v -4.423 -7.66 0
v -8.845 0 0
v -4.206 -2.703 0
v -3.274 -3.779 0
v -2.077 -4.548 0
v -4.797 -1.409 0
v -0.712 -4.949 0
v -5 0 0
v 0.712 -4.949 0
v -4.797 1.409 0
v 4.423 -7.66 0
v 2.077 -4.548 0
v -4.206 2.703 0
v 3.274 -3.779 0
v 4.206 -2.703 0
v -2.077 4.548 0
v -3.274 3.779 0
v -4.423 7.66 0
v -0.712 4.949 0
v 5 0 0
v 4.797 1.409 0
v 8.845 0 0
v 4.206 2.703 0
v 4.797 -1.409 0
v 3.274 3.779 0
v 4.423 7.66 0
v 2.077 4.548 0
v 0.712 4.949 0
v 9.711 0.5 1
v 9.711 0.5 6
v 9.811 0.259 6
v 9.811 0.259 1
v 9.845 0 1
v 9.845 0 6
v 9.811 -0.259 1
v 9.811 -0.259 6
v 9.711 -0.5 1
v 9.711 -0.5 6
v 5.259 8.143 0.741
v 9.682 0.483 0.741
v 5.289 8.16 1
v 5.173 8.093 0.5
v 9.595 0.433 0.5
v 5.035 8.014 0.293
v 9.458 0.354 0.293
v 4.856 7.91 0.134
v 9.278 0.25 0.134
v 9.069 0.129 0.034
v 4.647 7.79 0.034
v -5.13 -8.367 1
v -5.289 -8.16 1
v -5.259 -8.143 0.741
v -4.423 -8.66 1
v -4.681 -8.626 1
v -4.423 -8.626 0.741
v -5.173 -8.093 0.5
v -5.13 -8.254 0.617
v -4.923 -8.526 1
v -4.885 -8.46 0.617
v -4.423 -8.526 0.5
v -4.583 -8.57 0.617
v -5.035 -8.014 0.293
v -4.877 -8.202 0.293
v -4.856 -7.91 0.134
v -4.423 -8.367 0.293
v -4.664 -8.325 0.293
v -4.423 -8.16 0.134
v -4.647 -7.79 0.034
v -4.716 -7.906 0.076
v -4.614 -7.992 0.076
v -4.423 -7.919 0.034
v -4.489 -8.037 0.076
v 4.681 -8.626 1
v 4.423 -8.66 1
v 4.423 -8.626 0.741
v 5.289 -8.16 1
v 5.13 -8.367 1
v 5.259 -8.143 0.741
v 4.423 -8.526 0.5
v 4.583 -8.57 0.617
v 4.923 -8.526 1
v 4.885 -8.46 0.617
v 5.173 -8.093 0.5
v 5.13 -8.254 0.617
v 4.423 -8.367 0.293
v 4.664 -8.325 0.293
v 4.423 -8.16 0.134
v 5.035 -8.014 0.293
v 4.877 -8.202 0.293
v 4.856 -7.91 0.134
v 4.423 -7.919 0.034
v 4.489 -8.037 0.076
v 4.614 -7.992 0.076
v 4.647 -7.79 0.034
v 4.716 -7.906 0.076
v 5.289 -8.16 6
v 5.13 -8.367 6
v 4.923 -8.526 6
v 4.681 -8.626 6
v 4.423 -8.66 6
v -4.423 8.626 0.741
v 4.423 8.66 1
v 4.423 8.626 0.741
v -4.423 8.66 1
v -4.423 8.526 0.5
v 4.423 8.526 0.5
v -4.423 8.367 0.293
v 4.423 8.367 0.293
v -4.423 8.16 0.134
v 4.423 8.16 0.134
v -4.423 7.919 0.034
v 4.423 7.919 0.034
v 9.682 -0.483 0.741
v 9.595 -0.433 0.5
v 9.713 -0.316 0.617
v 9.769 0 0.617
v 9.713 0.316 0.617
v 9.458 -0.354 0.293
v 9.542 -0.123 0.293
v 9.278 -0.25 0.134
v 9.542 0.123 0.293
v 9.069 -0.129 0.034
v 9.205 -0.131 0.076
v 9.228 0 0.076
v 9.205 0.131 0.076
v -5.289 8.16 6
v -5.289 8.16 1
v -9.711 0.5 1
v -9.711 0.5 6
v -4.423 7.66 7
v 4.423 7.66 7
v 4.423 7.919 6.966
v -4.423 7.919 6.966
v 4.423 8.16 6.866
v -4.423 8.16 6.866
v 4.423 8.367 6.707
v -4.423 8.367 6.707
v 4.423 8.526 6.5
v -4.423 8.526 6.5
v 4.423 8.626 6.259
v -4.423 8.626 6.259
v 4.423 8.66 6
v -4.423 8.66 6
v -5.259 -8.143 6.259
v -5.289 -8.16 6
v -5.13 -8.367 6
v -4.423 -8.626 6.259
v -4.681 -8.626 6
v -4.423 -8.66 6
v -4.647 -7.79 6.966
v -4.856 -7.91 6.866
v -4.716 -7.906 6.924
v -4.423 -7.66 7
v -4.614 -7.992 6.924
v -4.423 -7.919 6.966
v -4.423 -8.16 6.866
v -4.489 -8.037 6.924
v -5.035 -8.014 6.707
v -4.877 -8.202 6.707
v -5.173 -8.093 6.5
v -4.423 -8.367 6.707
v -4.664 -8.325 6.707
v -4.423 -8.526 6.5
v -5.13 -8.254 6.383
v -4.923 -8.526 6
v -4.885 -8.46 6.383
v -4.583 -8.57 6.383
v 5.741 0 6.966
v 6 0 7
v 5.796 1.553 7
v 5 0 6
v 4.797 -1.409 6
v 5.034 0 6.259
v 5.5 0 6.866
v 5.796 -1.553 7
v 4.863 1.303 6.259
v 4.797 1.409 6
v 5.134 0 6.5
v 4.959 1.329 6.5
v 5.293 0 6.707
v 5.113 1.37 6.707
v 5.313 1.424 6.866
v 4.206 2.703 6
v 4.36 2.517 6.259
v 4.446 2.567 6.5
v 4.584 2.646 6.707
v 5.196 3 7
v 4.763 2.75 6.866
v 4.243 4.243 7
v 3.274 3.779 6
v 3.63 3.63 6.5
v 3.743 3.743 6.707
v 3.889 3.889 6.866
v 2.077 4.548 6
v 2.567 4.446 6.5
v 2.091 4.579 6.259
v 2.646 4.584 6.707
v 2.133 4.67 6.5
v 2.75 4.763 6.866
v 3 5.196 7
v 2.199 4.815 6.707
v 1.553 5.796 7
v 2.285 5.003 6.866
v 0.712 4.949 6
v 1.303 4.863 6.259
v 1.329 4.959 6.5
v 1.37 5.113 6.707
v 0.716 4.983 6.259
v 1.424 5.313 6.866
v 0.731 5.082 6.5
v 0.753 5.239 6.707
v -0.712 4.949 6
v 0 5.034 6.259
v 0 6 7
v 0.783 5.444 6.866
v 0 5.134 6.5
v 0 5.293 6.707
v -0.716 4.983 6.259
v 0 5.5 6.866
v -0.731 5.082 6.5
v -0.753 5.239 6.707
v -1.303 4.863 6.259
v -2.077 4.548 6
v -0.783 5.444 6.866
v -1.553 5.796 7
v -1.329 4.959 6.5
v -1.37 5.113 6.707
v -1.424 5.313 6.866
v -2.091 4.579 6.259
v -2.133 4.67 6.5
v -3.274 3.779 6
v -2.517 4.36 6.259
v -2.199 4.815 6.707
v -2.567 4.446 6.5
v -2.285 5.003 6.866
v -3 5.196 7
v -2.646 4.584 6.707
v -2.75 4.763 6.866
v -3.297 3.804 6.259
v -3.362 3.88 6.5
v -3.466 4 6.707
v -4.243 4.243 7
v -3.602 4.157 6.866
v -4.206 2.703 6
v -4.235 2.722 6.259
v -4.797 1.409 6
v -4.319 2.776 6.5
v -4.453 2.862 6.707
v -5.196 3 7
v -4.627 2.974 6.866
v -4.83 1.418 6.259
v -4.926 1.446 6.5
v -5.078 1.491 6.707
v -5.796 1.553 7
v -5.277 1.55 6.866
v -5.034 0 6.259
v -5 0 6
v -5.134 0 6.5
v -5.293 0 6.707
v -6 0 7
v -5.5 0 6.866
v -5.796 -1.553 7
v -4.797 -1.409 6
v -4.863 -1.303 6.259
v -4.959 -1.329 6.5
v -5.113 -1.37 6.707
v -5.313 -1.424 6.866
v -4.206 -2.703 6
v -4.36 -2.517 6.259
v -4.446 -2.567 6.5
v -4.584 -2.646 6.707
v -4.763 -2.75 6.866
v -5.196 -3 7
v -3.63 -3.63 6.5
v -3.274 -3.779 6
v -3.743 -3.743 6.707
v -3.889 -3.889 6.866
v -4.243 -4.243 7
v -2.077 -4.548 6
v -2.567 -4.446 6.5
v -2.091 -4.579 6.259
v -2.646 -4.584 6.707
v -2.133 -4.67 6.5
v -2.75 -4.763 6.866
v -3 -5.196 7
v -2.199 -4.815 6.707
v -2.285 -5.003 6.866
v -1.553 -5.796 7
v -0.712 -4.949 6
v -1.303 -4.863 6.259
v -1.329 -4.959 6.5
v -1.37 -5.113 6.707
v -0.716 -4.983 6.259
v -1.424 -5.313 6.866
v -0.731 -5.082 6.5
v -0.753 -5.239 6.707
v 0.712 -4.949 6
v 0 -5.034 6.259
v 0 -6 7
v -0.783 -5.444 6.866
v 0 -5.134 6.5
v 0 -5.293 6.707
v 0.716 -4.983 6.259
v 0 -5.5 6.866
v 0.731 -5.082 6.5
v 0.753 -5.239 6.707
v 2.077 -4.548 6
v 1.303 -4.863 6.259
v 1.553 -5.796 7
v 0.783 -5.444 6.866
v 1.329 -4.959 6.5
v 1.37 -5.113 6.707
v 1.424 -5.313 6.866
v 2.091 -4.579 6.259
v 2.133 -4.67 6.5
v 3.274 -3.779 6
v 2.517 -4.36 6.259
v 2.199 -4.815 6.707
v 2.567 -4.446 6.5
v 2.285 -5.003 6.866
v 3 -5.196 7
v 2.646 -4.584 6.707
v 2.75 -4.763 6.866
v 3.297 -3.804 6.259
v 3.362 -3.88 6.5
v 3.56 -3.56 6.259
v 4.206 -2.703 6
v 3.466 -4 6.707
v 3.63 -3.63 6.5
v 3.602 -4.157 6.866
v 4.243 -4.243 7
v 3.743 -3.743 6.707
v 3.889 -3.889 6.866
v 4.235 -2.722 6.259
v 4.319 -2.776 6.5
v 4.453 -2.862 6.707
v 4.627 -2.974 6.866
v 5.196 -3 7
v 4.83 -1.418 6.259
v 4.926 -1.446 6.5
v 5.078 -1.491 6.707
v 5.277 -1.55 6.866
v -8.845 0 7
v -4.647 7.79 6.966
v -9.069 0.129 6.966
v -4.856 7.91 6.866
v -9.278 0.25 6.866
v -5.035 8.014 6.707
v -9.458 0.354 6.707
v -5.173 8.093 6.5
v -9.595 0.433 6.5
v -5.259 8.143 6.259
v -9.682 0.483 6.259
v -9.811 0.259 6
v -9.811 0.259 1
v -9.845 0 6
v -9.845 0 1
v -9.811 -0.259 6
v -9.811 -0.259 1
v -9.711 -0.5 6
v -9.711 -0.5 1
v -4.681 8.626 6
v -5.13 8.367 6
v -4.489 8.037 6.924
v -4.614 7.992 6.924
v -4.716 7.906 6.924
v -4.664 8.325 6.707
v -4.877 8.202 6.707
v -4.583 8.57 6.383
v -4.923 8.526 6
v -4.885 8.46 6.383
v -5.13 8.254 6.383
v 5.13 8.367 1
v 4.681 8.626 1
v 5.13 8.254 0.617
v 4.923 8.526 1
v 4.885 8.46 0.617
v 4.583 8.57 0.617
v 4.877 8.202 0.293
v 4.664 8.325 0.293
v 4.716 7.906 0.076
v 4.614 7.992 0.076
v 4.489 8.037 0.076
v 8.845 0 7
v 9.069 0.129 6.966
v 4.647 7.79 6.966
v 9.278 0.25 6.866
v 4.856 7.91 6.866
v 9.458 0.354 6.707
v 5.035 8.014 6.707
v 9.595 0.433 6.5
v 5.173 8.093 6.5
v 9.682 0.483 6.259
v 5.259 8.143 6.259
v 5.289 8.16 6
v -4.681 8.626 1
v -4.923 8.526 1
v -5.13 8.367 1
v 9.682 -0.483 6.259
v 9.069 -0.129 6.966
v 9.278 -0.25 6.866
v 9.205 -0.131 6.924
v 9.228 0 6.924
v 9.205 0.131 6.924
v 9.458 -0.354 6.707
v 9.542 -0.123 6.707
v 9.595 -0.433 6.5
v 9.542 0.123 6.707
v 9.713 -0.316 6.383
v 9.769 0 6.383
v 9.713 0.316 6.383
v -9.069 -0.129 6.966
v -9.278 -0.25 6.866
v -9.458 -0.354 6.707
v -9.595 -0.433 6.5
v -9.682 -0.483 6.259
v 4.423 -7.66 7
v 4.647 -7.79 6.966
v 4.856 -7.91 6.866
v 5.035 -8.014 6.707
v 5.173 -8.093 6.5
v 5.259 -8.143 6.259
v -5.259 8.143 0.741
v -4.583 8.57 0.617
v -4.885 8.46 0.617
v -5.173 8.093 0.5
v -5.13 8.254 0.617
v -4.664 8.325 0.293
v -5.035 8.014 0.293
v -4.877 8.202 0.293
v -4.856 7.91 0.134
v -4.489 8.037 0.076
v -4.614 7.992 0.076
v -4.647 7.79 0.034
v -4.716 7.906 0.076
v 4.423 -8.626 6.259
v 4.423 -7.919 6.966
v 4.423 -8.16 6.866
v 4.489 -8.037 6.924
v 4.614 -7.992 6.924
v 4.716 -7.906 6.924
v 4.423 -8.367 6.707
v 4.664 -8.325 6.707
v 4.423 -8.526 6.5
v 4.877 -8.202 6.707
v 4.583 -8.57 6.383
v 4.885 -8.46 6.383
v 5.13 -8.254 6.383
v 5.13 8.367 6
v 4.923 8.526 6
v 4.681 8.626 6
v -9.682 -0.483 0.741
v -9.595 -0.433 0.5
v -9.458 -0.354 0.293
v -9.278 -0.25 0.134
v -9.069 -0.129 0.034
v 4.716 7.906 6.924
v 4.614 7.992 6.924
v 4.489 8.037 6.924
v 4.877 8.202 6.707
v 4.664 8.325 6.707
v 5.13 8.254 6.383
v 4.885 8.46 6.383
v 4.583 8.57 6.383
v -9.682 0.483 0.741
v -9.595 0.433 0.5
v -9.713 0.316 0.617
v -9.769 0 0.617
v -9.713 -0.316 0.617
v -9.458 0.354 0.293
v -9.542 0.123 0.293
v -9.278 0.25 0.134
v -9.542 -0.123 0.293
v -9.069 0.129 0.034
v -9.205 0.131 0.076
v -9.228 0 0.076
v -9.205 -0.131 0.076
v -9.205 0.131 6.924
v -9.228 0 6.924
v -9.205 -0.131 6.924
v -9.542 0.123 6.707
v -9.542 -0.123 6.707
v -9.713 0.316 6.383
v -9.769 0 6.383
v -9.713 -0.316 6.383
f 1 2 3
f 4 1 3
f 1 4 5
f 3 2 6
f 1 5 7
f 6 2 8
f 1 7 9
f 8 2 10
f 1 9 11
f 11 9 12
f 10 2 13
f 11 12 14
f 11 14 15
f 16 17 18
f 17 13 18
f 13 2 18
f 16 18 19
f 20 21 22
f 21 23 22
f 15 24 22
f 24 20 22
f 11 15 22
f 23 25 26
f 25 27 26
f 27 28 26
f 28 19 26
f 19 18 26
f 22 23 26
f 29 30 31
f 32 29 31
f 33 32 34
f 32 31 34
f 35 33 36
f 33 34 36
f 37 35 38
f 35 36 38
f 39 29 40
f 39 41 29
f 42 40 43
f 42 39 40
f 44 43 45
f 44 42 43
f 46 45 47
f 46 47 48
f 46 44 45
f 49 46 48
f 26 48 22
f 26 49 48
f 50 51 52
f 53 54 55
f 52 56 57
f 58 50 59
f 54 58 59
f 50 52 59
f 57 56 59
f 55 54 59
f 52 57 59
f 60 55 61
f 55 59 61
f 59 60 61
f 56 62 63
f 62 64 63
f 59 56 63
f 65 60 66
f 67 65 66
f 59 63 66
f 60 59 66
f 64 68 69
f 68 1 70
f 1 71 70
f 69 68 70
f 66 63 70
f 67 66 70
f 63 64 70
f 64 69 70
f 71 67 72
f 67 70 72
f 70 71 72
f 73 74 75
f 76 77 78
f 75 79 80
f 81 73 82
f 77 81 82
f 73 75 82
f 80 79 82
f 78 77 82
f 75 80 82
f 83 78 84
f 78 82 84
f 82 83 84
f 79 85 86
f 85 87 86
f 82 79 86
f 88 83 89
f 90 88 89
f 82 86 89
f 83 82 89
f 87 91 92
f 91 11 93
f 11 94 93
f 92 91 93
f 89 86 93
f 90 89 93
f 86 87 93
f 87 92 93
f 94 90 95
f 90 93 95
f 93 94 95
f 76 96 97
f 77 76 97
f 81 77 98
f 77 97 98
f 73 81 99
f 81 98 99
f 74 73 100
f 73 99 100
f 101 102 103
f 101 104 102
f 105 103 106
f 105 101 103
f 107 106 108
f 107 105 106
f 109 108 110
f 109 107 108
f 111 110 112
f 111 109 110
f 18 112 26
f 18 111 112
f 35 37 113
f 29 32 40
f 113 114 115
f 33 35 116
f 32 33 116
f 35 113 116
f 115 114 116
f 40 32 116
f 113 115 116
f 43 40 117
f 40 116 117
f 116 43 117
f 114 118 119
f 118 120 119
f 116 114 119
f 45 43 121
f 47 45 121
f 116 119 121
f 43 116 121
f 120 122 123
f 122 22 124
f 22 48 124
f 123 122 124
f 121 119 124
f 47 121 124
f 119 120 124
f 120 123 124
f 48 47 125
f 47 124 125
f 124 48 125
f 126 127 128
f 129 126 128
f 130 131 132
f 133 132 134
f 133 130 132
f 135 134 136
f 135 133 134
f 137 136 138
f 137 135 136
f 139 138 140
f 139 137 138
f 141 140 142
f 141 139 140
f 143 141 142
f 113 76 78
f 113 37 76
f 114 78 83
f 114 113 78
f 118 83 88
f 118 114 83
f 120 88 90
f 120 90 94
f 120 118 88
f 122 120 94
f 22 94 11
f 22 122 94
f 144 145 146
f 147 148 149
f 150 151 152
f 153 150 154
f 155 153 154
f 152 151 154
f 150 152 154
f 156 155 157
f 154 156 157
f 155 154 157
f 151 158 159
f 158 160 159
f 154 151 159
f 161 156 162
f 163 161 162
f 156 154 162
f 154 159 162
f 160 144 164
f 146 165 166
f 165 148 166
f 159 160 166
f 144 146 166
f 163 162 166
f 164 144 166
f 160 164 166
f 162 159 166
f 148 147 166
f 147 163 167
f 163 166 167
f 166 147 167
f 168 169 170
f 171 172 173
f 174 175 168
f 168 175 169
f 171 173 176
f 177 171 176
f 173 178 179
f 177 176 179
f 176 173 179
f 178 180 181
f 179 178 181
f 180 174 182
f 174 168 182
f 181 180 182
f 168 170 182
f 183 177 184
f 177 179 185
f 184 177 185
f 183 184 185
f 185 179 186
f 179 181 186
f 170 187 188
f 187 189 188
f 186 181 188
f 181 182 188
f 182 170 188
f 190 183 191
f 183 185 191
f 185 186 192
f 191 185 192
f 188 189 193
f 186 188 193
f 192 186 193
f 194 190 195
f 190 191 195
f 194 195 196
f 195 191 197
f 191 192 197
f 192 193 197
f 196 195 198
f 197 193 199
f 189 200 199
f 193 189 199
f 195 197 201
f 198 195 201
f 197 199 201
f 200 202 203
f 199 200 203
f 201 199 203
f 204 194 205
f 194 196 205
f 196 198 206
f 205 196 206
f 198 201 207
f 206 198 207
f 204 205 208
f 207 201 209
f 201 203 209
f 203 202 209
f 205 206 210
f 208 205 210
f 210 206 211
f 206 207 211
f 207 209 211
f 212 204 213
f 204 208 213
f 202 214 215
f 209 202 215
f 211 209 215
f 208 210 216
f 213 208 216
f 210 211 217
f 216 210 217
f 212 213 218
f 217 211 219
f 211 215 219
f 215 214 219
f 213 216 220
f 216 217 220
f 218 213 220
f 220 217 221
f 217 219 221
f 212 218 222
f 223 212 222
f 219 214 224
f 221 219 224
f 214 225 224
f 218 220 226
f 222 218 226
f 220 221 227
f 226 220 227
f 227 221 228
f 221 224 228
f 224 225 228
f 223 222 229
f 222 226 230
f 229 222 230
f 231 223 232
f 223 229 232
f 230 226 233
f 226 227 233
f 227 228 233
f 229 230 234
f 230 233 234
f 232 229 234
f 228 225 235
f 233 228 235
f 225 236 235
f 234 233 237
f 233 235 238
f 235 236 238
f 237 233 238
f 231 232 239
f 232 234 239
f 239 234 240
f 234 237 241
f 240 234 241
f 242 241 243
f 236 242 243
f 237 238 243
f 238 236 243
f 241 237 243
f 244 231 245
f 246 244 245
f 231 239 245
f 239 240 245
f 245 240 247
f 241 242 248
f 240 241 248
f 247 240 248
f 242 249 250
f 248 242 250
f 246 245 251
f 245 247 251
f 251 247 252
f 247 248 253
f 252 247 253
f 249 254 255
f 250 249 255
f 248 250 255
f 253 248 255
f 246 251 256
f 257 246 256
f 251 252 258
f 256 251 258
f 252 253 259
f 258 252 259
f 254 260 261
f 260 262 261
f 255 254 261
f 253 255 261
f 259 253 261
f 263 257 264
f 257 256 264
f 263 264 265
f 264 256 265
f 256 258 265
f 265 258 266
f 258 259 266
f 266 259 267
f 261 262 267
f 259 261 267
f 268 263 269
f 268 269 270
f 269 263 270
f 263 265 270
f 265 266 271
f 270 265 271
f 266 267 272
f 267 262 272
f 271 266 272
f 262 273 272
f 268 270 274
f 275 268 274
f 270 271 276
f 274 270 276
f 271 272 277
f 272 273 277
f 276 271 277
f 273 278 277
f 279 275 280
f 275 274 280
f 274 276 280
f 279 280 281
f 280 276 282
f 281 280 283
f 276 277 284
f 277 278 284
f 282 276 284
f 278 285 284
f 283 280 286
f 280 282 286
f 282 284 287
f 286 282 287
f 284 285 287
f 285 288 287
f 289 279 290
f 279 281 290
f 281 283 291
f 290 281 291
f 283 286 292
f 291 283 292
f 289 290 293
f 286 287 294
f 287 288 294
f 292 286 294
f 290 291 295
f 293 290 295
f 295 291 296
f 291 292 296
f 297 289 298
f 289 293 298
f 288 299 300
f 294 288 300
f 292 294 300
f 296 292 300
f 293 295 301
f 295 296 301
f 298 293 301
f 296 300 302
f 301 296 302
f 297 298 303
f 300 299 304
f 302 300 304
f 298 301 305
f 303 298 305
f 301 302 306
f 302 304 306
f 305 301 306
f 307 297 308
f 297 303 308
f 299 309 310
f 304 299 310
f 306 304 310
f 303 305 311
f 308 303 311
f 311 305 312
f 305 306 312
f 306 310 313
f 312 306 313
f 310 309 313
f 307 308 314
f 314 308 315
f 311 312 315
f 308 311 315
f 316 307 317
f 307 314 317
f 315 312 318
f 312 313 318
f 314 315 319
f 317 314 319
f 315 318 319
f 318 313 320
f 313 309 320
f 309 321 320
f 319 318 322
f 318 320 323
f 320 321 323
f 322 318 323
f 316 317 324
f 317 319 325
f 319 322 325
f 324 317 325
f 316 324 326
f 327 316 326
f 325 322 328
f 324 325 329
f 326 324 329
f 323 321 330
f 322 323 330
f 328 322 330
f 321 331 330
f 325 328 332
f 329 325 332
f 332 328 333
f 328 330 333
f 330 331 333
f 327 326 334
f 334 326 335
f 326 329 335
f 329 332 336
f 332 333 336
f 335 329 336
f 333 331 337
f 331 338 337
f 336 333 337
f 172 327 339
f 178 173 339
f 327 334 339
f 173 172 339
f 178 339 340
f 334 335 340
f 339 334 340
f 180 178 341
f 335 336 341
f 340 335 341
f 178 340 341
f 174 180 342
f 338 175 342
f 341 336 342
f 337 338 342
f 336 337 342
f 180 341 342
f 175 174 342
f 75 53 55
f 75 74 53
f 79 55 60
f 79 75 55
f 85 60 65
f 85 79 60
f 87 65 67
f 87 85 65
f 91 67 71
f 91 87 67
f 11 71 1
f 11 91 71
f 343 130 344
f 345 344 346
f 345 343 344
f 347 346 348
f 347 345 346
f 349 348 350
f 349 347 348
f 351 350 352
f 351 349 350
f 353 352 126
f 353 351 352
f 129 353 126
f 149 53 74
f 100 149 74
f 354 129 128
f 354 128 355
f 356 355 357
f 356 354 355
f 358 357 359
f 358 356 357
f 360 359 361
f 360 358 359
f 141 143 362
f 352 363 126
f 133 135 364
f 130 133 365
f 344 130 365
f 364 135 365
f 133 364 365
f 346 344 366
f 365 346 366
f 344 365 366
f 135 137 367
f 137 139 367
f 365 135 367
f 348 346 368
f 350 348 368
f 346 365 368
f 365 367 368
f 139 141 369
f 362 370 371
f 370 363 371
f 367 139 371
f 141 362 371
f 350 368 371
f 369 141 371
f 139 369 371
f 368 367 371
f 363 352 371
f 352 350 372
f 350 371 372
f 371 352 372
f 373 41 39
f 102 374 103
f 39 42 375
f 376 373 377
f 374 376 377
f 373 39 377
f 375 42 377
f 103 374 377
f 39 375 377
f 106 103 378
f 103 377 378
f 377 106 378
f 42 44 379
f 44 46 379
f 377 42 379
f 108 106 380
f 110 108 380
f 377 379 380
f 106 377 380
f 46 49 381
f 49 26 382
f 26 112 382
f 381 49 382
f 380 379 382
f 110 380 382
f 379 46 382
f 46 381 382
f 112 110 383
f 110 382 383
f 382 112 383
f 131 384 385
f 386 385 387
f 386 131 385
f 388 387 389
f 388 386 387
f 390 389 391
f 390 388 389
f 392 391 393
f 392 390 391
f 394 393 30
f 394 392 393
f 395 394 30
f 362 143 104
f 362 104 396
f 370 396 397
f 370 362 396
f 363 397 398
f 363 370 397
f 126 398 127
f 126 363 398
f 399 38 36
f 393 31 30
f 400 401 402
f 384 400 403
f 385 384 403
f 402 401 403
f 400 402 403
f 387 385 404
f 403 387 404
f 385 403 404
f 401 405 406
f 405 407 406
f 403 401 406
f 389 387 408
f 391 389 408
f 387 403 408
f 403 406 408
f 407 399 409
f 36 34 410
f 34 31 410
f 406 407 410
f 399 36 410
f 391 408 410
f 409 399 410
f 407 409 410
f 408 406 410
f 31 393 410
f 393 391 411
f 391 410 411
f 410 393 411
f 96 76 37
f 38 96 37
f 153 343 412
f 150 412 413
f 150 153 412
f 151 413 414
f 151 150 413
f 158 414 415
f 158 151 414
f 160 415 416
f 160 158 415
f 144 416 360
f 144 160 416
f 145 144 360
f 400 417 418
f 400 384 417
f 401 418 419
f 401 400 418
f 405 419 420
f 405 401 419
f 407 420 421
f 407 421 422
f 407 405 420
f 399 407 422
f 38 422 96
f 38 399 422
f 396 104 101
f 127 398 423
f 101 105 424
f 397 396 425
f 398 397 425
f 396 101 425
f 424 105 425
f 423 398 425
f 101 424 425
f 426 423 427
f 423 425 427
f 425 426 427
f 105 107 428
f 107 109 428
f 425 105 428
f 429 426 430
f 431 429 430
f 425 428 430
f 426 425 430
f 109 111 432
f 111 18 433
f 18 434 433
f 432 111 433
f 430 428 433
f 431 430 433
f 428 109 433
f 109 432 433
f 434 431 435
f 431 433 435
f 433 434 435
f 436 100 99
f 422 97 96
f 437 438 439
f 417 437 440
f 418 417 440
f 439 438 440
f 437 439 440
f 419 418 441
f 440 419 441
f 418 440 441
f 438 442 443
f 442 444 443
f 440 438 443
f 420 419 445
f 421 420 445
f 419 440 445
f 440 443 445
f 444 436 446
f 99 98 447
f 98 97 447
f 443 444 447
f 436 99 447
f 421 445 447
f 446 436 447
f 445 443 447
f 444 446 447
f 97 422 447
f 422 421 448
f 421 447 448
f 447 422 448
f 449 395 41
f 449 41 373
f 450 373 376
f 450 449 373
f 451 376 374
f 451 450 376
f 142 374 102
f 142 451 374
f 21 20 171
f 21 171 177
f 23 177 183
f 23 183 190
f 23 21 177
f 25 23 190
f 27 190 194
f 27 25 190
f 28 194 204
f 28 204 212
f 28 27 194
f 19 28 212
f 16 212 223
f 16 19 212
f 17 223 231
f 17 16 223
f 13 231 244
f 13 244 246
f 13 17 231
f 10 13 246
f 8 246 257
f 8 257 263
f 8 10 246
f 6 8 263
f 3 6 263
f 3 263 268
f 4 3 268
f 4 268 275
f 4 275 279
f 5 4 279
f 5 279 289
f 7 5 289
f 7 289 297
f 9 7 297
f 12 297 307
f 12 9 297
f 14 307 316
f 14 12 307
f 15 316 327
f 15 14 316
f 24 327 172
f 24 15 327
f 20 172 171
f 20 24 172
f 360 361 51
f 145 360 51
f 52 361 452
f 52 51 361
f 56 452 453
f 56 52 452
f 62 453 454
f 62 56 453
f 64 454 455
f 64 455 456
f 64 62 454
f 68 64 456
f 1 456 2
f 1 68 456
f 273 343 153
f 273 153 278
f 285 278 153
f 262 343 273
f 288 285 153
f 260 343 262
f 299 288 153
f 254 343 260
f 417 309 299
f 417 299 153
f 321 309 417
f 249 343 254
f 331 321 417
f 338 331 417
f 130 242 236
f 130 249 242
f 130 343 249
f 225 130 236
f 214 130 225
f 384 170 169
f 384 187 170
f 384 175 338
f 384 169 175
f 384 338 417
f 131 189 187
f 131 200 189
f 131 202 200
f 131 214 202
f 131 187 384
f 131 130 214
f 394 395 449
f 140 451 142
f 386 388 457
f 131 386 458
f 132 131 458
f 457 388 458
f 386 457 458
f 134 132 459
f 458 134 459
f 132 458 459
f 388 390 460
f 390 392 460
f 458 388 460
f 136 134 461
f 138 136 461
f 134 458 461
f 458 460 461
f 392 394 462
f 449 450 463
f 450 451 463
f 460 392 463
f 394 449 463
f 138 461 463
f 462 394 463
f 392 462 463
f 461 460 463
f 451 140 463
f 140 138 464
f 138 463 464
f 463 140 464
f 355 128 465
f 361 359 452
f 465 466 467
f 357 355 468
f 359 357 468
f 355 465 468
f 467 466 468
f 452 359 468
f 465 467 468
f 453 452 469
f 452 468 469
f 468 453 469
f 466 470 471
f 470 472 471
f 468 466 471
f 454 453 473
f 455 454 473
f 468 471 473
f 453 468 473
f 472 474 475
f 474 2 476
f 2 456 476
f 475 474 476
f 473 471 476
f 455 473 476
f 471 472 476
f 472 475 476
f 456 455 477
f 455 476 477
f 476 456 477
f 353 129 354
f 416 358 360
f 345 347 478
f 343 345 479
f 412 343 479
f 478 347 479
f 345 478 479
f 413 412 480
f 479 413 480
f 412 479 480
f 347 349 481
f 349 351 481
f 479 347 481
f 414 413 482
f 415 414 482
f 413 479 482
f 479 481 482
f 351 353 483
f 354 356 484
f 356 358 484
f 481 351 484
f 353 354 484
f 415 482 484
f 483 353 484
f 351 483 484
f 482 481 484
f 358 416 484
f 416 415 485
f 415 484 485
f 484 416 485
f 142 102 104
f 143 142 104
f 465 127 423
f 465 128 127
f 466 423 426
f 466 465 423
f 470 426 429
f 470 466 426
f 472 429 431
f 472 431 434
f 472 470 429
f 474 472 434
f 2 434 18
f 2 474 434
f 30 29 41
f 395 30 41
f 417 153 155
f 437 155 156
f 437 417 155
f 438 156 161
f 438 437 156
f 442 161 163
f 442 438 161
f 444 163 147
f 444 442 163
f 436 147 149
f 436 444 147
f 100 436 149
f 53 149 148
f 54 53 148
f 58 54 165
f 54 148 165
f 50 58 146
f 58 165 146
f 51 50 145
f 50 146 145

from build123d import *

# Parameters (mm, degrees)
SKETCH1_R           = 5
BOSS_EXTRUDE1_DEPTH = 7
FILLET1_R           = 1
FILLET2_R           = 1


with BuildPart() as part:
    # Sketch1 → Boss-Extrude1 (new body)
    with BuildSketch(Plane.XY):
        Polygon((10, 0), (5, 8.660254038), (-5, 8.660254038), (-10, 0), (-5, -8.660254038), (5, -8.660254038), align=None)
        Circle(SKETCH1_R, mode=Mode.SUBTRACT)
    extrude(amount=BOSS_EXTRUDE1_DEPTH)

    # Fillet1
    fillet1_edges = [part.edges().sort_by_distance(p)[0] for p in [
        (5, -8.660254038, 3.5),
        (-5, -8.660254038, 3.5),
        (-10, 0, 3.5),
        (-5, 8.660254038, 3.5),
        (5, 8.660254038, 3.5),
        (10, 0, 3.5),
        (-5, 0, 7),
    ]]
    fillet(fillet1_edges, radius=FILLET1_R)

    # Fillet2
    fillet2_edges = [part.edges().sort_by_distance(p)[0] for p in [
        (7.5, -4.330127019, 7),
        (7.5, 4.330127019, 7),
        (0, 8.660254038, 7),
        (-7.5, 4.330127019, 7),
        (-7.5, -4.330127019, 7),
        (0, -8.660254038, 7),
        (4.922649731, 8.526279442, 7),
        (-4.922649731, 8.526279442, 7),
        (-9.845299462, 0, 7),
        (-4.922649731, -8.526279442, 7),
        (4.922649731, -8.526279442, 7),
        (9.845299462, 0, 7),
        (7.5, 4.330127019, 0),
        (7.5, -4.330127019, 0),
        (0, -8.660254038, 0),
        (-7.5, -4.330127019, 0),
        (-7.5, 4.330127019, 0),
        (0, 8.660254038, 0),
        (4.922649731, 8.526279442, 0),
        (-4.922649731, 8.526279442, 0),
        (-9.845299462, 0, 0),
        (-4.922649731, -8.526279442, 0),
        (4.922649731, -8.526279442, 0),
        (9.845299462, 0, 0),
    ]]
    fillet(fillet2_edges, radius=FILLET2_R)


solid = part.part
